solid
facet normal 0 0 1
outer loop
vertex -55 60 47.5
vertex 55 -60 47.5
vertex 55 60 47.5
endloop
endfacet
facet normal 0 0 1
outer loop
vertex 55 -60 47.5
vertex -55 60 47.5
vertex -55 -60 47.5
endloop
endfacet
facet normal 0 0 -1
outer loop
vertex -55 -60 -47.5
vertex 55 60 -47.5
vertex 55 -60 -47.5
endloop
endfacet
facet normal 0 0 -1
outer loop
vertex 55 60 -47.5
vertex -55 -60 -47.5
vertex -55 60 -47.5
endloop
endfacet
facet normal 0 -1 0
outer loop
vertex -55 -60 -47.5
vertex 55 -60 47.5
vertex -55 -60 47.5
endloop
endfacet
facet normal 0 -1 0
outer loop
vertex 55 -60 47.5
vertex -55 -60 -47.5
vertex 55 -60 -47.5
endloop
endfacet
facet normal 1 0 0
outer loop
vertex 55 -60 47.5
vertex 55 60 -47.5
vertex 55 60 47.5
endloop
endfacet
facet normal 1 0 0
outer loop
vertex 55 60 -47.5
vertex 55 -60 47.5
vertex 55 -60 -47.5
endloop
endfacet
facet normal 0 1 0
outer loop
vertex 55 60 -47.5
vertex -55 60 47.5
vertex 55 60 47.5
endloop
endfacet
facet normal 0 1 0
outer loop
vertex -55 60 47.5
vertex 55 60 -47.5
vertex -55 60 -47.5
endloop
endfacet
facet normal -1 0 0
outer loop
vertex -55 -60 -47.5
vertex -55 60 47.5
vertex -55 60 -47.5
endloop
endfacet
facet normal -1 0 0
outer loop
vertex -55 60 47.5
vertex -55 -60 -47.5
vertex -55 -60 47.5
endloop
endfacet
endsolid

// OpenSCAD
// ========================================
// a 110 x 120 x 95 mm box
// NeuroCAD canonical IR; dimensions are millimetres
// ========================================
$fn = 48;

cube(size=[110, 120, 95], center=true);
